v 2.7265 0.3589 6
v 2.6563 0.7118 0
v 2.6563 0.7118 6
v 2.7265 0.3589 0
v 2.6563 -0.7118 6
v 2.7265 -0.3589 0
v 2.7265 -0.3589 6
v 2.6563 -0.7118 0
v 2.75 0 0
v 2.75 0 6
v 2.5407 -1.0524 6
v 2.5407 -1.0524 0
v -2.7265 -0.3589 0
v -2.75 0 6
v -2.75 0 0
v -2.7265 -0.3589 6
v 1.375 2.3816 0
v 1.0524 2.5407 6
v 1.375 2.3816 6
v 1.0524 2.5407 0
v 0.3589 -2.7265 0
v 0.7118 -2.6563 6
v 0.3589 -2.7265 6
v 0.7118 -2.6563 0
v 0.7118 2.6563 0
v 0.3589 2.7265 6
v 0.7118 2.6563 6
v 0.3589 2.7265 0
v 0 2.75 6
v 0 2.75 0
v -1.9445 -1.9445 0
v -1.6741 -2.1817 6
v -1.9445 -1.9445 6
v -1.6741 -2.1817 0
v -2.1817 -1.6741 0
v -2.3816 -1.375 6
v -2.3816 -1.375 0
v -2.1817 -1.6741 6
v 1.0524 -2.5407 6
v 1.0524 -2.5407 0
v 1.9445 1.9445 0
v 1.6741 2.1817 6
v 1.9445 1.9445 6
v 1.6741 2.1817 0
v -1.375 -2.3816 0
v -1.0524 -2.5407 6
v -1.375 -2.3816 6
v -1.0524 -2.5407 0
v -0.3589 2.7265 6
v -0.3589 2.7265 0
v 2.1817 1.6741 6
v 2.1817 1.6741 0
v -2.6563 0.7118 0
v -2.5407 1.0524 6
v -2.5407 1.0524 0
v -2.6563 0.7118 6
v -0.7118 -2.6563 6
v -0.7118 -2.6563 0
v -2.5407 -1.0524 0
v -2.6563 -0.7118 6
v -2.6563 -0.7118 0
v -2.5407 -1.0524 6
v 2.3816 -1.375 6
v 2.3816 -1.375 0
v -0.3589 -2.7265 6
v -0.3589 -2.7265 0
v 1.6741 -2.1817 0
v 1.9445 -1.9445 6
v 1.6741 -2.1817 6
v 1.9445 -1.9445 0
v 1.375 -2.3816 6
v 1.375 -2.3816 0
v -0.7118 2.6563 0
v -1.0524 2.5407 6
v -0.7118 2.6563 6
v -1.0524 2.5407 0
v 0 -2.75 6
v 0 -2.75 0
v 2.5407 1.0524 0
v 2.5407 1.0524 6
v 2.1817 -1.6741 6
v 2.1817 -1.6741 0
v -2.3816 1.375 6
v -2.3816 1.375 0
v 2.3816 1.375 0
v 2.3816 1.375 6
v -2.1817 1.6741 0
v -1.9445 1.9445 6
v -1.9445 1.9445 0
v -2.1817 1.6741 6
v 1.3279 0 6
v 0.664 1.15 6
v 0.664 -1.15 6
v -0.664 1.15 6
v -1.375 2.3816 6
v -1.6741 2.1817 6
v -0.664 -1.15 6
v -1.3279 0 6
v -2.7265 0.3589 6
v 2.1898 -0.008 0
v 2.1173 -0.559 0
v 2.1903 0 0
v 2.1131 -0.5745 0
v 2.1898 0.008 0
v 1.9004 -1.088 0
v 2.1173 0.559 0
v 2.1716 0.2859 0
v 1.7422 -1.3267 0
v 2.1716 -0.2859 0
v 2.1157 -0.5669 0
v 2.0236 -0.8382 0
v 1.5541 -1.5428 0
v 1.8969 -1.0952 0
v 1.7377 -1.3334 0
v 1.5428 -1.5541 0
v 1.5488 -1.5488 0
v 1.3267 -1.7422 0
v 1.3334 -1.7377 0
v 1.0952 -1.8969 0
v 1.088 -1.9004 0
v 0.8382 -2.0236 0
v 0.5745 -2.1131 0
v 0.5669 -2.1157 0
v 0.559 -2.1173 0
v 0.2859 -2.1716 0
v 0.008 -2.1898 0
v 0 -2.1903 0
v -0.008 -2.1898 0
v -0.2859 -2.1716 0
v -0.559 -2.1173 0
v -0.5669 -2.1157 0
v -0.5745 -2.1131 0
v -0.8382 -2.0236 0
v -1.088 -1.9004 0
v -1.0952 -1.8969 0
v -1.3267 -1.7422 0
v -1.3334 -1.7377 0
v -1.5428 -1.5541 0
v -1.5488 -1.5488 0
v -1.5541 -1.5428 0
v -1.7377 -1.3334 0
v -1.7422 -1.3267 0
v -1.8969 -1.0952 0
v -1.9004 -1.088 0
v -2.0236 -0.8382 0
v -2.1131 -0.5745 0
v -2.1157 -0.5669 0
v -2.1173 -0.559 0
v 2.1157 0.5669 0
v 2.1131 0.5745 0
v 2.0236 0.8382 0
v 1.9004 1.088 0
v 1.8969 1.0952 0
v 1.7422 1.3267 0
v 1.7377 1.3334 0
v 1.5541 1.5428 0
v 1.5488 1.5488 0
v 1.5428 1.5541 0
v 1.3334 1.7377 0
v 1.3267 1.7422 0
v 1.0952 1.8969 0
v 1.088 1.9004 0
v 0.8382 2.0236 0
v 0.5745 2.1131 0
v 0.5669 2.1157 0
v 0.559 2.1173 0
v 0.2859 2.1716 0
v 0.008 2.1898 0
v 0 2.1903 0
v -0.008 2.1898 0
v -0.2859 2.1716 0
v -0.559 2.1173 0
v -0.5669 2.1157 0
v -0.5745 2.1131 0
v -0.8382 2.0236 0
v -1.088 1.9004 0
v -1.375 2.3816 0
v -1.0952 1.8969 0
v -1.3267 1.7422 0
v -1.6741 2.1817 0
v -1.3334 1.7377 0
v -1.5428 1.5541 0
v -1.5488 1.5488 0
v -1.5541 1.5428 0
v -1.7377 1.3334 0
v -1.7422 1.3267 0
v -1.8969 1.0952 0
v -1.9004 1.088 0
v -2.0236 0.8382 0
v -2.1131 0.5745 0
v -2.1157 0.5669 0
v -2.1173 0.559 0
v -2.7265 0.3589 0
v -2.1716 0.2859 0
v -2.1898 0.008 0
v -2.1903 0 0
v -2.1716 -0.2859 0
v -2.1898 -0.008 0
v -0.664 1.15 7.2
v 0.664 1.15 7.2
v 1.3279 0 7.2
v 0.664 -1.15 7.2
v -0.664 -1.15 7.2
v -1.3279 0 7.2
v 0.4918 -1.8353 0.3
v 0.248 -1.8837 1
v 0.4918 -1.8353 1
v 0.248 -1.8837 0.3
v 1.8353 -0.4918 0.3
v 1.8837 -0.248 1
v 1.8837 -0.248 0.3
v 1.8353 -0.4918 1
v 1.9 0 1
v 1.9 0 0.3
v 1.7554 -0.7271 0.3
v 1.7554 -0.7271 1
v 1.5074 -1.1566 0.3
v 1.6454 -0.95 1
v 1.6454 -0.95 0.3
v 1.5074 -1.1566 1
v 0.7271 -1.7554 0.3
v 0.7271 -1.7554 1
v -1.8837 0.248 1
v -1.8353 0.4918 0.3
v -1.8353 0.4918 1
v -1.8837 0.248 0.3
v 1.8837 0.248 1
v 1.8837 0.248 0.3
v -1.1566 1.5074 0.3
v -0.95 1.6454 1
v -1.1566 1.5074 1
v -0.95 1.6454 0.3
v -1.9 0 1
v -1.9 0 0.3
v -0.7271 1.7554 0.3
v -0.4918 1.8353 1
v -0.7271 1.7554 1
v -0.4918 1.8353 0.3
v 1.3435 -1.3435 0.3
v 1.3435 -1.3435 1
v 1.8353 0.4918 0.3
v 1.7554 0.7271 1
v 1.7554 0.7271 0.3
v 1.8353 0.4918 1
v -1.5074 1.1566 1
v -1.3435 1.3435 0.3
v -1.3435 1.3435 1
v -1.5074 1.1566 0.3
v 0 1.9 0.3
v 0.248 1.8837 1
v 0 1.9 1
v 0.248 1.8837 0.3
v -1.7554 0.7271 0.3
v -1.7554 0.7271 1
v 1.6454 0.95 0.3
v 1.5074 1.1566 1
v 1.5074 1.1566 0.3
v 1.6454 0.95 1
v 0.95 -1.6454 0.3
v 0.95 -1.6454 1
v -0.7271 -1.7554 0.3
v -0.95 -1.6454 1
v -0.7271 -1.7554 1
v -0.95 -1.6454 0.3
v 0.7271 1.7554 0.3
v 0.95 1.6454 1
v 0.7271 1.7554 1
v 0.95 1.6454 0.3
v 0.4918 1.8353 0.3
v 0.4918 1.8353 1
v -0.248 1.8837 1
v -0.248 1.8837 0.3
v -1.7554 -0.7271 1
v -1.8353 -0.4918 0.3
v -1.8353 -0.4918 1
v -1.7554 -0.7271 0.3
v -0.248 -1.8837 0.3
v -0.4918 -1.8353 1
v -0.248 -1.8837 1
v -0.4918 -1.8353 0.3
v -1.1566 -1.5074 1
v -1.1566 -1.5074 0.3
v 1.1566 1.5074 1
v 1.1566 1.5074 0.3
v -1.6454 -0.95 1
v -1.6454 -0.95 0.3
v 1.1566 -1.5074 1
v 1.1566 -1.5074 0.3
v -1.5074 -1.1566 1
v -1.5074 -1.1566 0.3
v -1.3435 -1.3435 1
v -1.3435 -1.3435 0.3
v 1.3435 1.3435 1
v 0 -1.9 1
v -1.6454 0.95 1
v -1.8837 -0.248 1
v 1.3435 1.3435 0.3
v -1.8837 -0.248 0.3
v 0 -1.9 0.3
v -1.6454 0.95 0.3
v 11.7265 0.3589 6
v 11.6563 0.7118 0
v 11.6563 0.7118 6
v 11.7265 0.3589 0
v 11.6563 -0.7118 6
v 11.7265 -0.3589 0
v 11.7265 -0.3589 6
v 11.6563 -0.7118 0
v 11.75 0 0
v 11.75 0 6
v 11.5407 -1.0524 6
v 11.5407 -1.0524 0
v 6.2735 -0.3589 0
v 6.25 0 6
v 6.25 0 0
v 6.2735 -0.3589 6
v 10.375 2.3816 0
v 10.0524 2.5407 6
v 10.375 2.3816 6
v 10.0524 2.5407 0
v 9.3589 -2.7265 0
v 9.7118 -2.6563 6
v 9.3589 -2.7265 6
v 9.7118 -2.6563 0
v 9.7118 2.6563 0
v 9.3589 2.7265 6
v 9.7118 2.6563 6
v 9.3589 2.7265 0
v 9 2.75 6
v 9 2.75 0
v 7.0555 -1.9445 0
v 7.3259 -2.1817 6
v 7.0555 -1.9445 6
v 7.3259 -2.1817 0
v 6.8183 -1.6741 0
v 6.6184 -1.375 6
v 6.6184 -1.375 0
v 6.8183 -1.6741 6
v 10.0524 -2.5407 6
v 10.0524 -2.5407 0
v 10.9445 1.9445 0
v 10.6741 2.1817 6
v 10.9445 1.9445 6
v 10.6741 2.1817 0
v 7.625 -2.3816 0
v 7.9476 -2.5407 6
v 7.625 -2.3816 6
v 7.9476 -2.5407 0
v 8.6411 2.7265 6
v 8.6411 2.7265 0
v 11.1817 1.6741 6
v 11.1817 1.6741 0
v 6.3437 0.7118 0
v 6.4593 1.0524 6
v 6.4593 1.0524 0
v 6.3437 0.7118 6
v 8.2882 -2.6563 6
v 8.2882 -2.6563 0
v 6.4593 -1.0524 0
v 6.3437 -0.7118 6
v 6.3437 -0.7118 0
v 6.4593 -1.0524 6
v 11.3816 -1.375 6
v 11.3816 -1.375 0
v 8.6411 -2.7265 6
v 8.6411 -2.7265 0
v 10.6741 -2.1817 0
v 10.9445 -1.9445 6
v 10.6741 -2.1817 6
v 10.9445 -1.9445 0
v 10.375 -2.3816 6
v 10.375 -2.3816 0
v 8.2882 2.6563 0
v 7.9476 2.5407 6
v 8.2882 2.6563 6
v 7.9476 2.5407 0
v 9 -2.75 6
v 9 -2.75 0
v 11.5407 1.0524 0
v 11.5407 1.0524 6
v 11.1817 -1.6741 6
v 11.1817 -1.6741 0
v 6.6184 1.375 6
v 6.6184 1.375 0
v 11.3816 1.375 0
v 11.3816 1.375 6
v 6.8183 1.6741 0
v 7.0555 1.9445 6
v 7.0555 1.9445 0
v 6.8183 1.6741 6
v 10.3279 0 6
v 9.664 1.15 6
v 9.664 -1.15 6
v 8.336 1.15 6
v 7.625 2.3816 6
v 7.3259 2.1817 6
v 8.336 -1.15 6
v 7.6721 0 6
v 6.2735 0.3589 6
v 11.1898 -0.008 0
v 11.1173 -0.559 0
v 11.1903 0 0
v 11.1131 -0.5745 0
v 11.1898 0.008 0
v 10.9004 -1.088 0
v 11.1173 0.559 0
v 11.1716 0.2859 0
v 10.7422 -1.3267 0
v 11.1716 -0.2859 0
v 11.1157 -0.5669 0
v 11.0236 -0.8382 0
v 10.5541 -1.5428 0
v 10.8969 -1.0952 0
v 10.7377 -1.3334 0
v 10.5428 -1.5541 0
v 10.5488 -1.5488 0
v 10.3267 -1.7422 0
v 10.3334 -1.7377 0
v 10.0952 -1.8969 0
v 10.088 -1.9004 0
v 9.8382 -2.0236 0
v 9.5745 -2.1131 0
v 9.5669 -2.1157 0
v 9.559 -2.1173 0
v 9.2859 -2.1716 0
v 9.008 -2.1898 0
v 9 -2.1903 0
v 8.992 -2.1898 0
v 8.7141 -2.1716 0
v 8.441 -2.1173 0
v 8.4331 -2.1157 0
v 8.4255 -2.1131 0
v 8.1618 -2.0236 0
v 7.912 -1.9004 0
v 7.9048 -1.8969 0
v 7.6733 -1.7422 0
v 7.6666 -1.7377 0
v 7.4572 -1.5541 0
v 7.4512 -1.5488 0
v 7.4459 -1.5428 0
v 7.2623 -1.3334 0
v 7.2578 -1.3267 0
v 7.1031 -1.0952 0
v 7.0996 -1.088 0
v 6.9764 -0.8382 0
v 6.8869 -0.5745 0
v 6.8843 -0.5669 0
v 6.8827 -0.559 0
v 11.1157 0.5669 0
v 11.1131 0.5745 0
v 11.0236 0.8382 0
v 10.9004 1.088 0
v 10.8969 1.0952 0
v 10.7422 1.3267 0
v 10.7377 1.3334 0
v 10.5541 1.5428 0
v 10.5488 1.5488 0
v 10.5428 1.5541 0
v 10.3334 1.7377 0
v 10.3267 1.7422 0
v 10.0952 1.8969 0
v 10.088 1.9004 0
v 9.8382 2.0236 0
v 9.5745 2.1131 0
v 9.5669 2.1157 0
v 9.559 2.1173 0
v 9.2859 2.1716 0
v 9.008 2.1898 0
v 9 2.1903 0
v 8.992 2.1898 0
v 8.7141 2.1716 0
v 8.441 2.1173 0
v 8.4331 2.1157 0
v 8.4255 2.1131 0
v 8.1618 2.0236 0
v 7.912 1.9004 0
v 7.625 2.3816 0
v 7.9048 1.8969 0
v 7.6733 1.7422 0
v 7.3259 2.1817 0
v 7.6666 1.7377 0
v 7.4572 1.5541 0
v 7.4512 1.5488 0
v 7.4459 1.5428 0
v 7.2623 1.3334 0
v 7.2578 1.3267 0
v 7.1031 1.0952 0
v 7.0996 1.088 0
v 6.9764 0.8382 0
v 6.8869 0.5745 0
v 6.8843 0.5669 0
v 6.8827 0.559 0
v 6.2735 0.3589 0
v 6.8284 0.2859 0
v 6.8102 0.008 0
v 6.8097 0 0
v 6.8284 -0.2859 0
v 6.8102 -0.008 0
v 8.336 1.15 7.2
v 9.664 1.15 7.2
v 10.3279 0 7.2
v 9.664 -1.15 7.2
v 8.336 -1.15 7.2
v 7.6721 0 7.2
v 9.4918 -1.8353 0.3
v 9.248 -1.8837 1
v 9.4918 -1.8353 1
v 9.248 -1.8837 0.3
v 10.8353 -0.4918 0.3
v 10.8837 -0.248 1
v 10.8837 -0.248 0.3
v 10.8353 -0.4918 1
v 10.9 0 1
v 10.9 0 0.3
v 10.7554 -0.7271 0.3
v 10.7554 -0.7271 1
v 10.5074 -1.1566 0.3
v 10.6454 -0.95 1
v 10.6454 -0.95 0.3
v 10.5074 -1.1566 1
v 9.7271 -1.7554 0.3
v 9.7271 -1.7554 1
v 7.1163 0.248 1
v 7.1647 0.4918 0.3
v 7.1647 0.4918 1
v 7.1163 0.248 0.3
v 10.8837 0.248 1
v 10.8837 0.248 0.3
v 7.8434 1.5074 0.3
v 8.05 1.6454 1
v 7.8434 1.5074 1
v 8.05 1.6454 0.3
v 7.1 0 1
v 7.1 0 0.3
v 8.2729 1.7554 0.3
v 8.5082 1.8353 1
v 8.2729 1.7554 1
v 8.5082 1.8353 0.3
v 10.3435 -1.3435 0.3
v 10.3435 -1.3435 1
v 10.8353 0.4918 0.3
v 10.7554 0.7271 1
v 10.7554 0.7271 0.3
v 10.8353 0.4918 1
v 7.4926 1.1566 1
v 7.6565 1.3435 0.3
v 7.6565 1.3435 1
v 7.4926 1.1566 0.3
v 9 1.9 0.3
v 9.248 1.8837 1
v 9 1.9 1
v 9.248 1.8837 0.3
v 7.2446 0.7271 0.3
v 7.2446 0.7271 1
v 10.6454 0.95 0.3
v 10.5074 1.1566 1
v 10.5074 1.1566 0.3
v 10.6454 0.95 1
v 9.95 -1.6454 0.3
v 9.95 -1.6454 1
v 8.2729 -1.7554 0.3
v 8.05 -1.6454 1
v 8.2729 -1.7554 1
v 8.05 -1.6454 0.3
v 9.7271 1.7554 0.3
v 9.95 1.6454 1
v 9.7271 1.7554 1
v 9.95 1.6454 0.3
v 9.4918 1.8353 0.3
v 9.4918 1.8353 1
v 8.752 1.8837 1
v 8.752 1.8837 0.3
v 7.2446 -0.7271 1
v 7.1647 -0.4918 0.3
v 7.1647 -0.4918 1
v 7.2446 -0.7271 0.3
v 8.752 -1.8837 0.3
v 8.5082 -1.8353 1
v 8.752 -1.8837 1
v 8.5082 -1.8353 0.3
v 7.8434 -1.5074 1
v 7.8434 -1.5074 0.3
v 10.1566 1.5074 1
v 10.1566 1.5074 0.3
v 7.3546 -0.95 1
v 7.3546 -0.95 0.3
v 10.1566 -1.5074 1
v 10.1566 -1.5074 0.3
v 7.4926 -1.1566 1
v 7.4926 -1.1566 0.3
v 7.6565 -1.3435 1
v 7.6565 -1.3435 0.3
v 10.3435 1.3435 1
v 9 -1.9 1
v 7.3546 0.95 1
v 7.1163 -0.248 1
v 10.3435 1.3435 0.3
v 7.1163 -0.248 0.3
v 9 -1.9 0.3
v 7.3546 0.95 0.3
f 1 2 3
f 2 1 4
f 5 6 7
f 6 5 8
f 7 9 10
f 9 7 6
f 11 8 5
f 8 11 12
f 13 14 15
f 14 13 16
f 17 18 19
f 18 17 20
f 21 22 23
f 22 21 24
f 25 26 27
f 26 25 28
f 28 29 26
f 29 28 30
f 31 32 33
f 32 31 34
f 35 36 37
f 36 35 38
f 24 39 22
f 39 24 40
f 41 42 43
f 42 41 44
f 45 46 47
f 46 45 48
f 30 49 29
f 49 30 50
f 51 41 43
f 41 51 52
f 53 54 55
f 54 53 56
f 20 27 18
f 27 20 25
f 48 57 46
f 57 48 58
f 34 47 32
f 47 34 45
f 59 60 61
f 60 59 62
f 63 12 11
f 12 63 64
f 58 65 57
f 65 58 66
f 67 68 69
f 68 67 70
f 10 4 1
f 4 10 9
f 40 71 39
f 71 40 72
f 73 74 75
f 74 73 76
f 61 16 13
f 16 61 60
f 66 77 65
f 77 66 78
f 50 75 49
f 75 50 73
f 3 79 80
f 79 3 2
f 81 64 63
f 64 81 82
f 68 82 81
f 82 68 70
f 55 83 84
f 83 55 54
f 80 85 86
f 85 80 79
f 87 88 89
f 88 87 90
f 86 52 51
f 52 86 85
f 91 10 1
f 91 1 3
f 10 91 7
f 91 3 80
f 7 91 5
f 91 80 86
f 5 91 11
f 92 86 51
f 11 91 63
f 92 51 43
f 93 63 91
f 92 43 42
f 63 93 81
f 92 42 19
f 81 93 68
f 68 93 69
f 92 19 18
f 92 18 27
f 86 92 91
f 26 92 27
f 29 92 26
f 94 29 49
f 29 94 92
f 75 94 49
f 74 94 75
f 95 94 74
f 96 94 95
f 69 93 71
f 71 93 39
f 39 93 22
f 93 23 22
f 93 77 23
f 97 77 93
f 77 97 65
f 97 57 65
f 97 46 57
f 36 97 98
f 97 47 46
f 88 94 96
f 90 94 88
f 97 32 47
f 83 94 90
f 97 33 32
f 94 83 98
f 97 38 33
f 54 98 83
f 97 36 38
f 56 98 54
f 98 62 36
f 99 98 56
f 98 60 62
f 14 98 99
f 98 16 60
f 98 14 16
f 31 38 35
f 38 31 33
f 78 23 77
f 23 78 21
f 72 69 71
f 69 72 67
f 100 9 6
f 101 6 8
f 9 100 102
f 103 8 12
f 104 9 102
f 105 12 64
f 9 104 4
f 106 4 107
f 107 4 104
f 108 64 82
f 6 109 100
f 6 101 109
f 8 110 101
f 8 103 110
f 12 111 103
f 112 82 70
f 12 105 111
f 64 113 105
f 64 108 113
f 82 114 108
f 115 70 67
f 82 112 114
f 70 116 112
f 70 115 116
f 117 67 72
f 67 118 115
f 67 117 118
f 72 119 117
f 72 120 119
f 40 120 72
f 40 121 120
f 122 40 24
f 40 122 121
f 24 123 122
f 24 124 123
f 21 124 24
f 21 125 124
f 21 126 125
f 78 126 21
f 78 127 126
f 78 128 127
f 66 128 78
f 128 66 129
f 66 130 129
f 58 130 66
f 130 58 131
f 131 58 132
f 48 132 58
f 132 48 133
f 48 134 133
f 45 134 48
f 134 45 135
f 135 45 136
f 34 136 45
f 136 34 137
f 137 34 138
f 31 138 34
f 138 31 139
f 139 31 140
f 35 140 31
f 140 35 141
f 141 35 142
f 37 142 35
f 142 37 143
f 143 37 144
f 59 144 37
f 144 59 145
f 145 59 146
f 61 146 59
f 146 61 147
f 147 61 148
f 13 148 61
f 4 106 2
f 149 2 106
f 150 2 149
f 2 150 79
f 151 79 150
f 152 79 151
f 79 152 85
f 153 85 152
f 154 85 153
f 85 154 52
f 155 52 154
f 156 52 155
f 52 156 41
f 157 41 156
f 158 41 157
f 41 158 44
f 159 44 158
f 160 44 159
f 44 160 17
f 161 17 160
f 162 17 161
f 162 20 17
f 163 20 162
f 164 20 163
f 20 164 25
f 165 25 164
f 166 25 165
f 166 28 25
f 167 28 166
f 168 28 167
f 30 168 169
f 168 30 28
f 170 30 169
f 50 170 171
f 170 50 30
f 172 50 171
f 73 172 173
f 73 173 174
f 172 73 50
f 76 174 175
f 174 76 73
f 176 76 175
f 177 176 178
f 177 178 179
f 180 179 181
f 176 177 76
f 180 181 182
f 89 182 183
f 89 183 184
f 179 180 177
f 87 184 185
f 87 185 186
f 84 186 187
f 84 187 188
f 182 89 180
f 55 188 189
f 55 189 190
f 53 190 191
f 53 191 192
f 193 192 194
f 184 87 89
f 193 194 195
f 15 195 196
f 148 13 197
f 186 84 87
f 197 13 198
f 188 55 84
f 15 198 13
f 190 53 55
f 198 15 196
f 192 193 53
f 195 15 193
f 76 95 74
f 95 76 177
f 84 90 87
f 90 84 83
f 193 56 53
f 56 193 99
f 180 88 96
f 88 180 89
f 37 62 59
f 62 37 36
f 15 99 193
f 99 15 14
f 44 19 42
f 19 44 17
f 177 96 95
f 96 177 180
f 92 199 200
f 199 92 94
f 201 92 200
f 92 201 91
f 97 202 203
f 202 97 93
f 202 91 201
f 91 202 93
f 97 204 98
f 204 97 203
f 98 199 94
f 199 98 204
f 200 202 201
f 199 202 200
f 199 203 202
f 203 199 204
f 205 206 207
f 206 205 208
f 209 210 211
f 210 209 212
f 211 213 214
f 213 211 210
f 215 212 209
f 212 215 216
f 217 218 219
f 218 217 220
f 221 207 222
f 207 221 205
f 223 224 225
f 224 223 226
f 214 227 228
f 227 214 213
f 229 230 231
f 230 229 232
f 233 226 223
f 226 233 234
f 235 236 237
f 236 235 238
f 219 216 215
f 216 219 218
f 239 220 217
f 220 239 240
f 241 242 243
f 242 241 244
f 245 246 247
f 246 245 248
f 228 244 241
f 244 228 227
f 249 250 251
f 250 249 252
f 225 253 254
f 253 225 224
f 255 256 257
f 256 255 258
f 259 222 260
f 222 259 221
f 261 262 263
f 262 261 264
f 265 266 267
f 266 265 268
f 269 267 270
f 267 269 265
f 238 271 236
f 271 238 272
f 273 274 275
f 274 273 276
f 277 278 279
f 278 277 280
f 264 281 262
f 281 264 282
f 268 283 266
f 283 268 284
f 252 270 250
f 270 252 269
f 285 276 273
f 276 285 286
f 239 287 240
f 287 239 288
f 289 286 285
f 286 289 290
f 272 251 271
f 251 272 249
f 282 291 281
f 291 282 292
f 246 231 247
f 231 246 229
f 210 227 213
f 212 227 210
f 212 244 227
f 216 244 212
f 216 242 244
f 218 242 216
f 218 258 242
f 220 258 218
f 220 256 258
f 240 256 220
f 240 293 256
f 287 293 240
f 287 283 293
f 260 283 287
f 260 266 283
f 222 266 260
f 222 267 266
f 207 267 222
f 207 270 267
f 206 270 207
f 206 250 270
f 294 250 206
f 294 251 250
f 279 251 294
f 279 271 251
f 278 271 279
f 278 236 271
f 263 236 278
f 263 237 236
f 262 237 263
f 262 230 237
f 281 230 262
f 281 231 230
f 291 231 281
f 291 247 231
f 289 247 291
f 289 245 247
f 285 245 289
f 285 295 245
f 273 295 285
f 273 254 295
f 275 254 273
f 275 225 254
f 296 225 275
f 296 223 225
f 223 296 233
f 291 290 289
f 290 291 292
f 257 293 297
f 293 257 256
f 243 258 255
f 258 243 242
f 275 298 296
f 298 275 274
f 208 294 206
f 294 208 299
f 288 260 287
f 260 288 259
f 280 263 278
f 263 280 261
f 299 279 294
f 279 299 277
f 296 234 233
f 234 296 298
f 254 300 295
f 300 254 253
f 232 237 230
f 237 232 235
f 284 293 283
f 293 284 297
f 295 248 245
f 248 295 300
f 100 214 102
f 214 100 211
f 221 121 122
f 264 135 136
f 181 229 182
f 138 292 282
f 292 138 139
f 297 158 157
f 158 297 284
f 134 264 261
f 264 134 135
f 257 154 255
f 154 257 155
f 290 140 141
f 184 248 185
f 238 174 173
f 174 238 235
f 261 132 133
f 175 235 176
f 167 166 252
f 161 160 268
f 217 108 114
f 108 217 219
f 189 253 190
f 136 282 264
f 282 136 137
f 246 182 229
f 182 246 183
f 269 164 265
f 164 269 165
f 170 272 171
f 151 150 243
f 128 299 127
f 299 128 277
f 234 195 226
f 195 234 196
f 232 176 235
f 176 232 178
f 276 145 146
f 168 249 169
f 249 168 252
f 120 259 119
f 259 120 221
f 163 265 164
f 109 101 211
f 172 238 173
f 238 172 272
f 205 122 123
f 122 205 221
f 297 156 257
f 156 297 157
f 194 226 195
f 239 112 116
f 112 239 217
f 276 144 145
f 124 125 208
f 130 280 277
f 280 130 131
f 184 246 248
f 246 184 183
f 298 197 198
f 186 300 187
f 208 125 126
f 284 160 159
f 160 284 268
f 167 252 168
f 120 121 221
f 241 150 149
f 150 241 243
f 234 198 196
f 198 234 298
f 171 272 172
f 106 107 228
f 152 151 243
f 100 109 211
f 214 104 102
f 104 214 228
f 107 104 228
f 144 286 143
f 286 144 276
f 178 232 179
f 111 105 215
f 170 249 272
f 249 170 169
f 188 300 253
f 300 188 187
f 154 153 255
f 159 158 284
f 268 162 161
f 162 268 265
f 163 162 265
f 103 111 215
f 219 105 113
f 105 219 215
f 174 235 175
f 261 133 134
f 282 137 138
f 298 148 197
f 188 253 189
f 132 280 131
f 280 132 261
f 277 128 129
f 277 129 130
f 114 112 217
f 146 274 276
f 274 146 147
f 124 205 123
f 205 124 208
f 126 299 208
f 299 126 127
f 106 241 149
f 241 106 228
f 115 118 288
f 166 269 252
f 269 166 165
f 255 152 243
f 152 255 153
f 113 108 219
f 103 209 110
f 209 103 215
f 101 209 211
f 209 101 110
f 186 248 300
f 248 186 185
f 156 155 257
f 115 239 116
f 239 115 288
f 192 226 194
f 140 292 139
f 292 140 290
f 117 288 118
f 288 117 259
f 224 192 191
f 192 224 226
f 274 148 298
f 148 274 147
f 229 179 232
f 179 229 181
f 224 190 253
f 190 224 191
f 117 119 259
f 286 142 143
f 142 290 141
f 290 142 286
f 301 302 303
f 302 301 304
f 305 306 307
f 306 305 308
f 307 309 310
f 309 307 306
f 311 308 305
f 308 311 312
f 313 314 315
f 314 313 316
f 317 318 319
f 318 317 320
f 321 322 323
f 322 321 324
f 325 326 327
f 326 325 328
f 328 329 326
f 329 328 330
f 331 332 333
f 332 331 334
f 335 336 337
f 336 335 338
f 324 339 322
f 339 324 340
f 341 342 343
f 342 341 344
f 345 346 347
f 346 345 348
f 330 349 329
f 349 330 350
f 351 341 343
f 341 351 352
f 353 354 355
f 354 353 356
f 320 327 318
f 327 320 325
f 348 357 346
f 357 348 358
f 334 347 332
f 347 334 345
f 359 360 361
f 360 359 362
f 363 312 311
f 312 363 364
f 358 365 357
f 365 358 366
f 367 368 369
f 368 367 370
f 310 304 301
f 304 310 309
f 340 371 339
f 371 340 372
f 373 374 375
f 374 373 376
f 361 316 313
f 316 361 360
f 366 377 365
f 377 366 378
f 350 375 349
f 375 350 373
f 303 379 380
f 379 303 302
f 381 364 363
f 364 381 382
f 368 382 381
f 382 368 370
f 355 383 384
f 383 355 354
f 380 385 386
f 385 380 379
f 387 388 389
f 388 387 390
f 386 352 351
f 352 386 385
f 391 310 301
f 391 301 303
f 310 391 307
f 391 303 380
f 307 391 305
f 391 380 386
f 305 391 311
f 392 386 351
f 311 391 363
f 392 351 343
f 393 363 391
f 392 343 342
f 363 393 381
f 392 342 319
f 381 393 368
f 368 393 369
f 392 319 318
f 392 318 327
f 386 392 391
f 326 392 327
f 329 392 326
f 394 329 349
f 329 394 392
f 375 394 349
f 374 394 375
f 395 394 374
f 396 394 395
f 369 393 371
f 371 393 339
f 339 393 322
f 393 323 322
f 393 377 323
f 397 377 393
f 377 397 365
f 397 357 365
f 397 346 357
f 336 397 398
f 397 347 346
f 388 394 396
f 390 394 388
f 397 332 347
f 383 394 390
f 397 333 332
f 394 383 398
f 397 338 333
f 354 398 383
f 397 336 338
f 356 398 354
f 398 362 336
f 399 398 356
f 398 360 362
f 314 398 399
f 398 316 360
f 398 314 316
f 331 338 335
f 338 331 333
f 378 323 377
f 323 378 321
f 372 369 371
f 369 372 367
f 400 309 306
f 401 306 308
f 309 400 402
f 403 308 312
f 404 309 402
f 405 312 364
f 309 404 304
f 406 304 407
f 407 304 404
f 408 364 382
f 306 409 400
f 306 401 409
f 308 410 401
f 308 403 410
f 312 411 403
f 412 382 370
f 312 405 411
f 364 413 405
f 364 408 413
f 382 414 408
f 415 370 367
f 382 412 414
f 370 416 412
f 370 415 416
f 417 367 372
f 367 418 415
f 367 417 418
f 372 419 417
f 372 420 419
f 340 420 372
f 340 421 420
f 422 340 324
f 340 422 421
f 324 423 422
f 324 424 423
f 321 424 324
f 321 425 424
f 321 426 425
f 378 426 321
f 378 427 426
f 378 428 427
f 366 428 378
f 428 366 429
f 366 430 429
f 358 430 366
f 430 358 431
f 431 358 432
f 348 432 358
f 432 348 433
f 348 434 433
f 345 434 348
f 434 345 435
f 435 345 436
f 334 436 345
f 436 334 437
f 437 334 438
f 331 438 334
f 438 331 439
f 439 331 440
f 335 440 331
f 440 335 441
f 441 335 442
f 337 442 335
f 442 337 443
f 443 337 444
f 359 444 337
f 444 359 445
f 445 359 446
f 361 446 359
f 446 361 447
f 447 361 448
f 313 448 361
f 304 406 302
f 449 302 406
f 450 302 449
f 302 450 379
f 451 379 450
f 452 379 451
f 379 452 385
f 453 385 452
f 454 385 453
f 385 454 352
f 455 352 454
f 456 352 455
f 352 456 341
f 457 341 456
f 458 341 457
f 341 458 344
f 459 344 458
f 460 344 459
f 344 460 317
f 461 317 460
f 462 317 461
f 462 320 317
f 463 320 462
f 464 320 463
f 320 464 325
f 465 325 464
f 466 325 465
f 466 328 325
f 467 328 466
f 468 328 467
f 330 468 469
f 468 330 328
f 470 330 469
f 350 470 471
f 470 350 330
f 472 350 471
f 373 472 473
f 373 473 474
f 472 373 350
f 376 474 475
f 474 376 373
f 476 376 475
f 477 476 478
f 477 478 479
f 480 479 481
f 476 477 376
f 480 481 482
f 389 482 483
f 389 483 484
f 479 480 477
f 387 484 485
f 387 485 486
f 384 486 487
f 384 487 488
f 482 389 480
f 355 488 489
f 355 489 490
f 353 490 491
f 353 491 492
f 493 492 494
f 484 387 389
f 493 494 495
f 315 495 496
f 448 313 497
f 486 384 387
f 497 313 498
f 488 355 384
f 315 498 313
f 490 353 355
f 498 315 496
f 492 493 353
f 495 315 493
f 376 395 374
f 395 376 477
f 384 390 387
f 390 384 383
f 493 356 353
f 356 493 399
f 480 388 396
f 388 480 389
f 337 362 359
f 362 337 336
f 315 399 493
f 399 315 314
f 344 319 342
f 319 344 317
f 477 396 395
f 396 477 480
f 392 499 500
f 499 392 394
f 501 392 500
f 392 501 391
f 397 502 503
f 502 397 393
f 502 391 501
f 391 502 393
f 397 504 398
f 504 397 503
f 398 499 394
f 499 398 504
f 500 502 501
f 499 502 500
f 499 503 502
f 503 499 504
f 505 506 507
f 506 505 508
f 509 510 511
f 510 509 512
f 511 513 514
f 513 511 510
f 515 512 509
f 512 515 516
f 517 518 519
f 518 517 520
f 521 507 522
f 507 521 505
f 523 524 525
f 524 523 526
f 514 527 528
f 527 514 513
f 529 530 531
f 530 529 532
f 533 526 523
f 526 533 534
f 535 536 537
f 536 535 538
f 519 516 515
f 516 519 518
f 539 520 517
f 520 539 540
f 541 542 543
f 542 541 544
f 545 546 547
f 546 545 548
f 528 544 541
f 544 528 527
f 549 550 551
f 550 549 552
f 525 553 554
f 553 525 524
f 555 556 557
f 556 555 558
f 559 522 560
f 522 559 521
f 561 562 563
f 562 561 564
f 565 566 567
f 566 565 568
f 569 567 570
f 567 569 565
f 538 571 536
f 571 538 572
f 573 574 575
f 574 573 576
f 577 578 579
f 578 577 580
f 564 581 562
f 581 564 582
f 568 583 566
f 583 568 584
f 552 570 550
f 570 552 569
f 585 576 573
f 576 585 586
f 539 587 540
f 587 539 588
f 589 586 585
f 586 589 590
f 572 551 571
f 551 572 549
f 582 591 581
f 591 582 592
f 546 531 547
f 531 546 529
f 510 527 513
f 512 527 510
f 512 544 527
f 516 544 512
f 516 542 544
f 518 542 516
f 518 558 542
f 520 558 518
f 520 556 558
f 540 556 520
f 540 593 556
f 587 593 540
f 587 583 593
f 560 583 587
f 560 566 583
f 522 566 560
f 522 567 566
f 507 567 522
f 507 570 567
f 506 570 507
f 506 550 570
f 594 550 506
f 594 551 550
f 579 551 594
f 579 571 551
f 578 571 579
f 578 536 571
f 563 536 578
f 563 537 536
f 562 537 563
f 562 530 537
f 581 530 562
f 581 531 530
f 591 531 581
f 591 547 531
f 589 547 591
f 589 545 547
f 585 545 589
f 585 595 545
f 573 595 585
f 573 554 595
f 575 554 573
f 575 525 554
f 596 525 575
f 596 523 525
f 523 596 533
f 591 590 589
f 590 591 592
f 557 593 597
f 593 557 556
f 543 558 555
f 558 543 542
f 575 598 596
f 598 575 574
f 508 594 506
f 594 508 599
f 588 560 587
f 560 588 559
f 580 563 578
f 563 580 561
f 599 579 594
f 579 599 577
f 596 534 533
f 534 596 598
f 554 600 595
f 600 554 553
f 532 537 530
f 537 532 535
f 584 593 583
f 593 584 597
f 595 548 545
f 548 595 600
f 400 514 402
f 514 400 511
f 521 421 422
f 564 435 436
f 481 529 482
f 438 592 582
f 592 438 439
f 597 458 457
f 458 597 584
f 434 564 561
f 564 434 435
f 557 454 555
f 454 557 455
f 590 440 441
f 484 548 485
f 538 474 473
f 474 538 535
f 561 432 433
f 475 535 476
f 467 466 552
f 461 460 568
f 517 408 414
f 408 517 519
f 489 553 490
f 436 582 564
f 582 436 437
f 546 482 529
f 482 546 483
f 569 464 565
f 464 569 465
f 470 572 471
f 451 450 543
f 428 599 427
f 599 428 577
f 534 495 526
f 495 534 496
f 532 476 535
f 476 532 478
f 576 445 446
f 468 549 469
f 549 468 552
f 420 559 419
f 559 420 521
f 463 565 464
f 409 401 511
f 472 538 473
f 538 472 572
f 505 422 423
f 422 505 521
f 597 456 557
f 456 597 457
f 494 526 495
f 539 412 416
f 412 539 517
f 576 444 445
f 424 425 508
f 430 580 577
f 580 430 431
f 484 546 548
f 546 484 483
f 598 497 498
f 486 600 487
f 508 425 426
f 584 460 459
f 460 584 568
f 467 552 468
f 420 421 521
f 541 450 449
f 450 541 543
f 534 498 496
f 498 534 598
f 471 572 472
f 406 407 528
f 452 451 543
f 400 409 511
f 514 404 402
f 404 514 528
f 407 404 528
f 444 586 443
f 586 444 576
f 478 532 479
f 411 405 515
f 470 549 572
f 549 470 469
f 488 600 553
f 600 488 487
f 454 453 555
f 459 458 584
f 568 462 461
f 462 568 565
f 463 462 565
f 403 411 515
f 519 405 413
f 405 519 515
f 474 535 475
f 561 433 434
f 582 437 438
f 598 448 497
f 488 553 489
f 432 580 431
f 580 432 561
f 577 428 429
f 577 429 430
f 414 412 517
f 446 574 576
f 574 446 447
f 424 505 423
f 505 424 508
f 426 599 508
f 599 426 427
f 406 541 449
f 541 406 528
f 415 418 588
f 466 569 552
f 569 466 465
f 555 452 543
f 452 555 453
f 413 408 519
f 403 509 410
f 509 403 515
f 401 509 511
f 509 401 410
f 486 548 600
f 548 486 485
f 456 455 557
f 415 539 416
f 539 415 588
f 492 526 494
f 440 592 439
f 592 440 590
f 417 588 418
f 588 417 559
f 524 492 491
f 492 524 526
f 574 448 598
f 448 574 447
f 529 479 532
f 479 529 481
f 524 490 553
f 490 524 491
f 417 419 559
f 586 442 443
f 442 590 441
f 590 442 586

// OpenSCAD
// Printed die caps (one spare): one sits on an M3 x 10, head up, in place of the M3 x 16. Die face down on the bed.
include <../cad/punch_rig_017.scad>
PART = "die_caps";
